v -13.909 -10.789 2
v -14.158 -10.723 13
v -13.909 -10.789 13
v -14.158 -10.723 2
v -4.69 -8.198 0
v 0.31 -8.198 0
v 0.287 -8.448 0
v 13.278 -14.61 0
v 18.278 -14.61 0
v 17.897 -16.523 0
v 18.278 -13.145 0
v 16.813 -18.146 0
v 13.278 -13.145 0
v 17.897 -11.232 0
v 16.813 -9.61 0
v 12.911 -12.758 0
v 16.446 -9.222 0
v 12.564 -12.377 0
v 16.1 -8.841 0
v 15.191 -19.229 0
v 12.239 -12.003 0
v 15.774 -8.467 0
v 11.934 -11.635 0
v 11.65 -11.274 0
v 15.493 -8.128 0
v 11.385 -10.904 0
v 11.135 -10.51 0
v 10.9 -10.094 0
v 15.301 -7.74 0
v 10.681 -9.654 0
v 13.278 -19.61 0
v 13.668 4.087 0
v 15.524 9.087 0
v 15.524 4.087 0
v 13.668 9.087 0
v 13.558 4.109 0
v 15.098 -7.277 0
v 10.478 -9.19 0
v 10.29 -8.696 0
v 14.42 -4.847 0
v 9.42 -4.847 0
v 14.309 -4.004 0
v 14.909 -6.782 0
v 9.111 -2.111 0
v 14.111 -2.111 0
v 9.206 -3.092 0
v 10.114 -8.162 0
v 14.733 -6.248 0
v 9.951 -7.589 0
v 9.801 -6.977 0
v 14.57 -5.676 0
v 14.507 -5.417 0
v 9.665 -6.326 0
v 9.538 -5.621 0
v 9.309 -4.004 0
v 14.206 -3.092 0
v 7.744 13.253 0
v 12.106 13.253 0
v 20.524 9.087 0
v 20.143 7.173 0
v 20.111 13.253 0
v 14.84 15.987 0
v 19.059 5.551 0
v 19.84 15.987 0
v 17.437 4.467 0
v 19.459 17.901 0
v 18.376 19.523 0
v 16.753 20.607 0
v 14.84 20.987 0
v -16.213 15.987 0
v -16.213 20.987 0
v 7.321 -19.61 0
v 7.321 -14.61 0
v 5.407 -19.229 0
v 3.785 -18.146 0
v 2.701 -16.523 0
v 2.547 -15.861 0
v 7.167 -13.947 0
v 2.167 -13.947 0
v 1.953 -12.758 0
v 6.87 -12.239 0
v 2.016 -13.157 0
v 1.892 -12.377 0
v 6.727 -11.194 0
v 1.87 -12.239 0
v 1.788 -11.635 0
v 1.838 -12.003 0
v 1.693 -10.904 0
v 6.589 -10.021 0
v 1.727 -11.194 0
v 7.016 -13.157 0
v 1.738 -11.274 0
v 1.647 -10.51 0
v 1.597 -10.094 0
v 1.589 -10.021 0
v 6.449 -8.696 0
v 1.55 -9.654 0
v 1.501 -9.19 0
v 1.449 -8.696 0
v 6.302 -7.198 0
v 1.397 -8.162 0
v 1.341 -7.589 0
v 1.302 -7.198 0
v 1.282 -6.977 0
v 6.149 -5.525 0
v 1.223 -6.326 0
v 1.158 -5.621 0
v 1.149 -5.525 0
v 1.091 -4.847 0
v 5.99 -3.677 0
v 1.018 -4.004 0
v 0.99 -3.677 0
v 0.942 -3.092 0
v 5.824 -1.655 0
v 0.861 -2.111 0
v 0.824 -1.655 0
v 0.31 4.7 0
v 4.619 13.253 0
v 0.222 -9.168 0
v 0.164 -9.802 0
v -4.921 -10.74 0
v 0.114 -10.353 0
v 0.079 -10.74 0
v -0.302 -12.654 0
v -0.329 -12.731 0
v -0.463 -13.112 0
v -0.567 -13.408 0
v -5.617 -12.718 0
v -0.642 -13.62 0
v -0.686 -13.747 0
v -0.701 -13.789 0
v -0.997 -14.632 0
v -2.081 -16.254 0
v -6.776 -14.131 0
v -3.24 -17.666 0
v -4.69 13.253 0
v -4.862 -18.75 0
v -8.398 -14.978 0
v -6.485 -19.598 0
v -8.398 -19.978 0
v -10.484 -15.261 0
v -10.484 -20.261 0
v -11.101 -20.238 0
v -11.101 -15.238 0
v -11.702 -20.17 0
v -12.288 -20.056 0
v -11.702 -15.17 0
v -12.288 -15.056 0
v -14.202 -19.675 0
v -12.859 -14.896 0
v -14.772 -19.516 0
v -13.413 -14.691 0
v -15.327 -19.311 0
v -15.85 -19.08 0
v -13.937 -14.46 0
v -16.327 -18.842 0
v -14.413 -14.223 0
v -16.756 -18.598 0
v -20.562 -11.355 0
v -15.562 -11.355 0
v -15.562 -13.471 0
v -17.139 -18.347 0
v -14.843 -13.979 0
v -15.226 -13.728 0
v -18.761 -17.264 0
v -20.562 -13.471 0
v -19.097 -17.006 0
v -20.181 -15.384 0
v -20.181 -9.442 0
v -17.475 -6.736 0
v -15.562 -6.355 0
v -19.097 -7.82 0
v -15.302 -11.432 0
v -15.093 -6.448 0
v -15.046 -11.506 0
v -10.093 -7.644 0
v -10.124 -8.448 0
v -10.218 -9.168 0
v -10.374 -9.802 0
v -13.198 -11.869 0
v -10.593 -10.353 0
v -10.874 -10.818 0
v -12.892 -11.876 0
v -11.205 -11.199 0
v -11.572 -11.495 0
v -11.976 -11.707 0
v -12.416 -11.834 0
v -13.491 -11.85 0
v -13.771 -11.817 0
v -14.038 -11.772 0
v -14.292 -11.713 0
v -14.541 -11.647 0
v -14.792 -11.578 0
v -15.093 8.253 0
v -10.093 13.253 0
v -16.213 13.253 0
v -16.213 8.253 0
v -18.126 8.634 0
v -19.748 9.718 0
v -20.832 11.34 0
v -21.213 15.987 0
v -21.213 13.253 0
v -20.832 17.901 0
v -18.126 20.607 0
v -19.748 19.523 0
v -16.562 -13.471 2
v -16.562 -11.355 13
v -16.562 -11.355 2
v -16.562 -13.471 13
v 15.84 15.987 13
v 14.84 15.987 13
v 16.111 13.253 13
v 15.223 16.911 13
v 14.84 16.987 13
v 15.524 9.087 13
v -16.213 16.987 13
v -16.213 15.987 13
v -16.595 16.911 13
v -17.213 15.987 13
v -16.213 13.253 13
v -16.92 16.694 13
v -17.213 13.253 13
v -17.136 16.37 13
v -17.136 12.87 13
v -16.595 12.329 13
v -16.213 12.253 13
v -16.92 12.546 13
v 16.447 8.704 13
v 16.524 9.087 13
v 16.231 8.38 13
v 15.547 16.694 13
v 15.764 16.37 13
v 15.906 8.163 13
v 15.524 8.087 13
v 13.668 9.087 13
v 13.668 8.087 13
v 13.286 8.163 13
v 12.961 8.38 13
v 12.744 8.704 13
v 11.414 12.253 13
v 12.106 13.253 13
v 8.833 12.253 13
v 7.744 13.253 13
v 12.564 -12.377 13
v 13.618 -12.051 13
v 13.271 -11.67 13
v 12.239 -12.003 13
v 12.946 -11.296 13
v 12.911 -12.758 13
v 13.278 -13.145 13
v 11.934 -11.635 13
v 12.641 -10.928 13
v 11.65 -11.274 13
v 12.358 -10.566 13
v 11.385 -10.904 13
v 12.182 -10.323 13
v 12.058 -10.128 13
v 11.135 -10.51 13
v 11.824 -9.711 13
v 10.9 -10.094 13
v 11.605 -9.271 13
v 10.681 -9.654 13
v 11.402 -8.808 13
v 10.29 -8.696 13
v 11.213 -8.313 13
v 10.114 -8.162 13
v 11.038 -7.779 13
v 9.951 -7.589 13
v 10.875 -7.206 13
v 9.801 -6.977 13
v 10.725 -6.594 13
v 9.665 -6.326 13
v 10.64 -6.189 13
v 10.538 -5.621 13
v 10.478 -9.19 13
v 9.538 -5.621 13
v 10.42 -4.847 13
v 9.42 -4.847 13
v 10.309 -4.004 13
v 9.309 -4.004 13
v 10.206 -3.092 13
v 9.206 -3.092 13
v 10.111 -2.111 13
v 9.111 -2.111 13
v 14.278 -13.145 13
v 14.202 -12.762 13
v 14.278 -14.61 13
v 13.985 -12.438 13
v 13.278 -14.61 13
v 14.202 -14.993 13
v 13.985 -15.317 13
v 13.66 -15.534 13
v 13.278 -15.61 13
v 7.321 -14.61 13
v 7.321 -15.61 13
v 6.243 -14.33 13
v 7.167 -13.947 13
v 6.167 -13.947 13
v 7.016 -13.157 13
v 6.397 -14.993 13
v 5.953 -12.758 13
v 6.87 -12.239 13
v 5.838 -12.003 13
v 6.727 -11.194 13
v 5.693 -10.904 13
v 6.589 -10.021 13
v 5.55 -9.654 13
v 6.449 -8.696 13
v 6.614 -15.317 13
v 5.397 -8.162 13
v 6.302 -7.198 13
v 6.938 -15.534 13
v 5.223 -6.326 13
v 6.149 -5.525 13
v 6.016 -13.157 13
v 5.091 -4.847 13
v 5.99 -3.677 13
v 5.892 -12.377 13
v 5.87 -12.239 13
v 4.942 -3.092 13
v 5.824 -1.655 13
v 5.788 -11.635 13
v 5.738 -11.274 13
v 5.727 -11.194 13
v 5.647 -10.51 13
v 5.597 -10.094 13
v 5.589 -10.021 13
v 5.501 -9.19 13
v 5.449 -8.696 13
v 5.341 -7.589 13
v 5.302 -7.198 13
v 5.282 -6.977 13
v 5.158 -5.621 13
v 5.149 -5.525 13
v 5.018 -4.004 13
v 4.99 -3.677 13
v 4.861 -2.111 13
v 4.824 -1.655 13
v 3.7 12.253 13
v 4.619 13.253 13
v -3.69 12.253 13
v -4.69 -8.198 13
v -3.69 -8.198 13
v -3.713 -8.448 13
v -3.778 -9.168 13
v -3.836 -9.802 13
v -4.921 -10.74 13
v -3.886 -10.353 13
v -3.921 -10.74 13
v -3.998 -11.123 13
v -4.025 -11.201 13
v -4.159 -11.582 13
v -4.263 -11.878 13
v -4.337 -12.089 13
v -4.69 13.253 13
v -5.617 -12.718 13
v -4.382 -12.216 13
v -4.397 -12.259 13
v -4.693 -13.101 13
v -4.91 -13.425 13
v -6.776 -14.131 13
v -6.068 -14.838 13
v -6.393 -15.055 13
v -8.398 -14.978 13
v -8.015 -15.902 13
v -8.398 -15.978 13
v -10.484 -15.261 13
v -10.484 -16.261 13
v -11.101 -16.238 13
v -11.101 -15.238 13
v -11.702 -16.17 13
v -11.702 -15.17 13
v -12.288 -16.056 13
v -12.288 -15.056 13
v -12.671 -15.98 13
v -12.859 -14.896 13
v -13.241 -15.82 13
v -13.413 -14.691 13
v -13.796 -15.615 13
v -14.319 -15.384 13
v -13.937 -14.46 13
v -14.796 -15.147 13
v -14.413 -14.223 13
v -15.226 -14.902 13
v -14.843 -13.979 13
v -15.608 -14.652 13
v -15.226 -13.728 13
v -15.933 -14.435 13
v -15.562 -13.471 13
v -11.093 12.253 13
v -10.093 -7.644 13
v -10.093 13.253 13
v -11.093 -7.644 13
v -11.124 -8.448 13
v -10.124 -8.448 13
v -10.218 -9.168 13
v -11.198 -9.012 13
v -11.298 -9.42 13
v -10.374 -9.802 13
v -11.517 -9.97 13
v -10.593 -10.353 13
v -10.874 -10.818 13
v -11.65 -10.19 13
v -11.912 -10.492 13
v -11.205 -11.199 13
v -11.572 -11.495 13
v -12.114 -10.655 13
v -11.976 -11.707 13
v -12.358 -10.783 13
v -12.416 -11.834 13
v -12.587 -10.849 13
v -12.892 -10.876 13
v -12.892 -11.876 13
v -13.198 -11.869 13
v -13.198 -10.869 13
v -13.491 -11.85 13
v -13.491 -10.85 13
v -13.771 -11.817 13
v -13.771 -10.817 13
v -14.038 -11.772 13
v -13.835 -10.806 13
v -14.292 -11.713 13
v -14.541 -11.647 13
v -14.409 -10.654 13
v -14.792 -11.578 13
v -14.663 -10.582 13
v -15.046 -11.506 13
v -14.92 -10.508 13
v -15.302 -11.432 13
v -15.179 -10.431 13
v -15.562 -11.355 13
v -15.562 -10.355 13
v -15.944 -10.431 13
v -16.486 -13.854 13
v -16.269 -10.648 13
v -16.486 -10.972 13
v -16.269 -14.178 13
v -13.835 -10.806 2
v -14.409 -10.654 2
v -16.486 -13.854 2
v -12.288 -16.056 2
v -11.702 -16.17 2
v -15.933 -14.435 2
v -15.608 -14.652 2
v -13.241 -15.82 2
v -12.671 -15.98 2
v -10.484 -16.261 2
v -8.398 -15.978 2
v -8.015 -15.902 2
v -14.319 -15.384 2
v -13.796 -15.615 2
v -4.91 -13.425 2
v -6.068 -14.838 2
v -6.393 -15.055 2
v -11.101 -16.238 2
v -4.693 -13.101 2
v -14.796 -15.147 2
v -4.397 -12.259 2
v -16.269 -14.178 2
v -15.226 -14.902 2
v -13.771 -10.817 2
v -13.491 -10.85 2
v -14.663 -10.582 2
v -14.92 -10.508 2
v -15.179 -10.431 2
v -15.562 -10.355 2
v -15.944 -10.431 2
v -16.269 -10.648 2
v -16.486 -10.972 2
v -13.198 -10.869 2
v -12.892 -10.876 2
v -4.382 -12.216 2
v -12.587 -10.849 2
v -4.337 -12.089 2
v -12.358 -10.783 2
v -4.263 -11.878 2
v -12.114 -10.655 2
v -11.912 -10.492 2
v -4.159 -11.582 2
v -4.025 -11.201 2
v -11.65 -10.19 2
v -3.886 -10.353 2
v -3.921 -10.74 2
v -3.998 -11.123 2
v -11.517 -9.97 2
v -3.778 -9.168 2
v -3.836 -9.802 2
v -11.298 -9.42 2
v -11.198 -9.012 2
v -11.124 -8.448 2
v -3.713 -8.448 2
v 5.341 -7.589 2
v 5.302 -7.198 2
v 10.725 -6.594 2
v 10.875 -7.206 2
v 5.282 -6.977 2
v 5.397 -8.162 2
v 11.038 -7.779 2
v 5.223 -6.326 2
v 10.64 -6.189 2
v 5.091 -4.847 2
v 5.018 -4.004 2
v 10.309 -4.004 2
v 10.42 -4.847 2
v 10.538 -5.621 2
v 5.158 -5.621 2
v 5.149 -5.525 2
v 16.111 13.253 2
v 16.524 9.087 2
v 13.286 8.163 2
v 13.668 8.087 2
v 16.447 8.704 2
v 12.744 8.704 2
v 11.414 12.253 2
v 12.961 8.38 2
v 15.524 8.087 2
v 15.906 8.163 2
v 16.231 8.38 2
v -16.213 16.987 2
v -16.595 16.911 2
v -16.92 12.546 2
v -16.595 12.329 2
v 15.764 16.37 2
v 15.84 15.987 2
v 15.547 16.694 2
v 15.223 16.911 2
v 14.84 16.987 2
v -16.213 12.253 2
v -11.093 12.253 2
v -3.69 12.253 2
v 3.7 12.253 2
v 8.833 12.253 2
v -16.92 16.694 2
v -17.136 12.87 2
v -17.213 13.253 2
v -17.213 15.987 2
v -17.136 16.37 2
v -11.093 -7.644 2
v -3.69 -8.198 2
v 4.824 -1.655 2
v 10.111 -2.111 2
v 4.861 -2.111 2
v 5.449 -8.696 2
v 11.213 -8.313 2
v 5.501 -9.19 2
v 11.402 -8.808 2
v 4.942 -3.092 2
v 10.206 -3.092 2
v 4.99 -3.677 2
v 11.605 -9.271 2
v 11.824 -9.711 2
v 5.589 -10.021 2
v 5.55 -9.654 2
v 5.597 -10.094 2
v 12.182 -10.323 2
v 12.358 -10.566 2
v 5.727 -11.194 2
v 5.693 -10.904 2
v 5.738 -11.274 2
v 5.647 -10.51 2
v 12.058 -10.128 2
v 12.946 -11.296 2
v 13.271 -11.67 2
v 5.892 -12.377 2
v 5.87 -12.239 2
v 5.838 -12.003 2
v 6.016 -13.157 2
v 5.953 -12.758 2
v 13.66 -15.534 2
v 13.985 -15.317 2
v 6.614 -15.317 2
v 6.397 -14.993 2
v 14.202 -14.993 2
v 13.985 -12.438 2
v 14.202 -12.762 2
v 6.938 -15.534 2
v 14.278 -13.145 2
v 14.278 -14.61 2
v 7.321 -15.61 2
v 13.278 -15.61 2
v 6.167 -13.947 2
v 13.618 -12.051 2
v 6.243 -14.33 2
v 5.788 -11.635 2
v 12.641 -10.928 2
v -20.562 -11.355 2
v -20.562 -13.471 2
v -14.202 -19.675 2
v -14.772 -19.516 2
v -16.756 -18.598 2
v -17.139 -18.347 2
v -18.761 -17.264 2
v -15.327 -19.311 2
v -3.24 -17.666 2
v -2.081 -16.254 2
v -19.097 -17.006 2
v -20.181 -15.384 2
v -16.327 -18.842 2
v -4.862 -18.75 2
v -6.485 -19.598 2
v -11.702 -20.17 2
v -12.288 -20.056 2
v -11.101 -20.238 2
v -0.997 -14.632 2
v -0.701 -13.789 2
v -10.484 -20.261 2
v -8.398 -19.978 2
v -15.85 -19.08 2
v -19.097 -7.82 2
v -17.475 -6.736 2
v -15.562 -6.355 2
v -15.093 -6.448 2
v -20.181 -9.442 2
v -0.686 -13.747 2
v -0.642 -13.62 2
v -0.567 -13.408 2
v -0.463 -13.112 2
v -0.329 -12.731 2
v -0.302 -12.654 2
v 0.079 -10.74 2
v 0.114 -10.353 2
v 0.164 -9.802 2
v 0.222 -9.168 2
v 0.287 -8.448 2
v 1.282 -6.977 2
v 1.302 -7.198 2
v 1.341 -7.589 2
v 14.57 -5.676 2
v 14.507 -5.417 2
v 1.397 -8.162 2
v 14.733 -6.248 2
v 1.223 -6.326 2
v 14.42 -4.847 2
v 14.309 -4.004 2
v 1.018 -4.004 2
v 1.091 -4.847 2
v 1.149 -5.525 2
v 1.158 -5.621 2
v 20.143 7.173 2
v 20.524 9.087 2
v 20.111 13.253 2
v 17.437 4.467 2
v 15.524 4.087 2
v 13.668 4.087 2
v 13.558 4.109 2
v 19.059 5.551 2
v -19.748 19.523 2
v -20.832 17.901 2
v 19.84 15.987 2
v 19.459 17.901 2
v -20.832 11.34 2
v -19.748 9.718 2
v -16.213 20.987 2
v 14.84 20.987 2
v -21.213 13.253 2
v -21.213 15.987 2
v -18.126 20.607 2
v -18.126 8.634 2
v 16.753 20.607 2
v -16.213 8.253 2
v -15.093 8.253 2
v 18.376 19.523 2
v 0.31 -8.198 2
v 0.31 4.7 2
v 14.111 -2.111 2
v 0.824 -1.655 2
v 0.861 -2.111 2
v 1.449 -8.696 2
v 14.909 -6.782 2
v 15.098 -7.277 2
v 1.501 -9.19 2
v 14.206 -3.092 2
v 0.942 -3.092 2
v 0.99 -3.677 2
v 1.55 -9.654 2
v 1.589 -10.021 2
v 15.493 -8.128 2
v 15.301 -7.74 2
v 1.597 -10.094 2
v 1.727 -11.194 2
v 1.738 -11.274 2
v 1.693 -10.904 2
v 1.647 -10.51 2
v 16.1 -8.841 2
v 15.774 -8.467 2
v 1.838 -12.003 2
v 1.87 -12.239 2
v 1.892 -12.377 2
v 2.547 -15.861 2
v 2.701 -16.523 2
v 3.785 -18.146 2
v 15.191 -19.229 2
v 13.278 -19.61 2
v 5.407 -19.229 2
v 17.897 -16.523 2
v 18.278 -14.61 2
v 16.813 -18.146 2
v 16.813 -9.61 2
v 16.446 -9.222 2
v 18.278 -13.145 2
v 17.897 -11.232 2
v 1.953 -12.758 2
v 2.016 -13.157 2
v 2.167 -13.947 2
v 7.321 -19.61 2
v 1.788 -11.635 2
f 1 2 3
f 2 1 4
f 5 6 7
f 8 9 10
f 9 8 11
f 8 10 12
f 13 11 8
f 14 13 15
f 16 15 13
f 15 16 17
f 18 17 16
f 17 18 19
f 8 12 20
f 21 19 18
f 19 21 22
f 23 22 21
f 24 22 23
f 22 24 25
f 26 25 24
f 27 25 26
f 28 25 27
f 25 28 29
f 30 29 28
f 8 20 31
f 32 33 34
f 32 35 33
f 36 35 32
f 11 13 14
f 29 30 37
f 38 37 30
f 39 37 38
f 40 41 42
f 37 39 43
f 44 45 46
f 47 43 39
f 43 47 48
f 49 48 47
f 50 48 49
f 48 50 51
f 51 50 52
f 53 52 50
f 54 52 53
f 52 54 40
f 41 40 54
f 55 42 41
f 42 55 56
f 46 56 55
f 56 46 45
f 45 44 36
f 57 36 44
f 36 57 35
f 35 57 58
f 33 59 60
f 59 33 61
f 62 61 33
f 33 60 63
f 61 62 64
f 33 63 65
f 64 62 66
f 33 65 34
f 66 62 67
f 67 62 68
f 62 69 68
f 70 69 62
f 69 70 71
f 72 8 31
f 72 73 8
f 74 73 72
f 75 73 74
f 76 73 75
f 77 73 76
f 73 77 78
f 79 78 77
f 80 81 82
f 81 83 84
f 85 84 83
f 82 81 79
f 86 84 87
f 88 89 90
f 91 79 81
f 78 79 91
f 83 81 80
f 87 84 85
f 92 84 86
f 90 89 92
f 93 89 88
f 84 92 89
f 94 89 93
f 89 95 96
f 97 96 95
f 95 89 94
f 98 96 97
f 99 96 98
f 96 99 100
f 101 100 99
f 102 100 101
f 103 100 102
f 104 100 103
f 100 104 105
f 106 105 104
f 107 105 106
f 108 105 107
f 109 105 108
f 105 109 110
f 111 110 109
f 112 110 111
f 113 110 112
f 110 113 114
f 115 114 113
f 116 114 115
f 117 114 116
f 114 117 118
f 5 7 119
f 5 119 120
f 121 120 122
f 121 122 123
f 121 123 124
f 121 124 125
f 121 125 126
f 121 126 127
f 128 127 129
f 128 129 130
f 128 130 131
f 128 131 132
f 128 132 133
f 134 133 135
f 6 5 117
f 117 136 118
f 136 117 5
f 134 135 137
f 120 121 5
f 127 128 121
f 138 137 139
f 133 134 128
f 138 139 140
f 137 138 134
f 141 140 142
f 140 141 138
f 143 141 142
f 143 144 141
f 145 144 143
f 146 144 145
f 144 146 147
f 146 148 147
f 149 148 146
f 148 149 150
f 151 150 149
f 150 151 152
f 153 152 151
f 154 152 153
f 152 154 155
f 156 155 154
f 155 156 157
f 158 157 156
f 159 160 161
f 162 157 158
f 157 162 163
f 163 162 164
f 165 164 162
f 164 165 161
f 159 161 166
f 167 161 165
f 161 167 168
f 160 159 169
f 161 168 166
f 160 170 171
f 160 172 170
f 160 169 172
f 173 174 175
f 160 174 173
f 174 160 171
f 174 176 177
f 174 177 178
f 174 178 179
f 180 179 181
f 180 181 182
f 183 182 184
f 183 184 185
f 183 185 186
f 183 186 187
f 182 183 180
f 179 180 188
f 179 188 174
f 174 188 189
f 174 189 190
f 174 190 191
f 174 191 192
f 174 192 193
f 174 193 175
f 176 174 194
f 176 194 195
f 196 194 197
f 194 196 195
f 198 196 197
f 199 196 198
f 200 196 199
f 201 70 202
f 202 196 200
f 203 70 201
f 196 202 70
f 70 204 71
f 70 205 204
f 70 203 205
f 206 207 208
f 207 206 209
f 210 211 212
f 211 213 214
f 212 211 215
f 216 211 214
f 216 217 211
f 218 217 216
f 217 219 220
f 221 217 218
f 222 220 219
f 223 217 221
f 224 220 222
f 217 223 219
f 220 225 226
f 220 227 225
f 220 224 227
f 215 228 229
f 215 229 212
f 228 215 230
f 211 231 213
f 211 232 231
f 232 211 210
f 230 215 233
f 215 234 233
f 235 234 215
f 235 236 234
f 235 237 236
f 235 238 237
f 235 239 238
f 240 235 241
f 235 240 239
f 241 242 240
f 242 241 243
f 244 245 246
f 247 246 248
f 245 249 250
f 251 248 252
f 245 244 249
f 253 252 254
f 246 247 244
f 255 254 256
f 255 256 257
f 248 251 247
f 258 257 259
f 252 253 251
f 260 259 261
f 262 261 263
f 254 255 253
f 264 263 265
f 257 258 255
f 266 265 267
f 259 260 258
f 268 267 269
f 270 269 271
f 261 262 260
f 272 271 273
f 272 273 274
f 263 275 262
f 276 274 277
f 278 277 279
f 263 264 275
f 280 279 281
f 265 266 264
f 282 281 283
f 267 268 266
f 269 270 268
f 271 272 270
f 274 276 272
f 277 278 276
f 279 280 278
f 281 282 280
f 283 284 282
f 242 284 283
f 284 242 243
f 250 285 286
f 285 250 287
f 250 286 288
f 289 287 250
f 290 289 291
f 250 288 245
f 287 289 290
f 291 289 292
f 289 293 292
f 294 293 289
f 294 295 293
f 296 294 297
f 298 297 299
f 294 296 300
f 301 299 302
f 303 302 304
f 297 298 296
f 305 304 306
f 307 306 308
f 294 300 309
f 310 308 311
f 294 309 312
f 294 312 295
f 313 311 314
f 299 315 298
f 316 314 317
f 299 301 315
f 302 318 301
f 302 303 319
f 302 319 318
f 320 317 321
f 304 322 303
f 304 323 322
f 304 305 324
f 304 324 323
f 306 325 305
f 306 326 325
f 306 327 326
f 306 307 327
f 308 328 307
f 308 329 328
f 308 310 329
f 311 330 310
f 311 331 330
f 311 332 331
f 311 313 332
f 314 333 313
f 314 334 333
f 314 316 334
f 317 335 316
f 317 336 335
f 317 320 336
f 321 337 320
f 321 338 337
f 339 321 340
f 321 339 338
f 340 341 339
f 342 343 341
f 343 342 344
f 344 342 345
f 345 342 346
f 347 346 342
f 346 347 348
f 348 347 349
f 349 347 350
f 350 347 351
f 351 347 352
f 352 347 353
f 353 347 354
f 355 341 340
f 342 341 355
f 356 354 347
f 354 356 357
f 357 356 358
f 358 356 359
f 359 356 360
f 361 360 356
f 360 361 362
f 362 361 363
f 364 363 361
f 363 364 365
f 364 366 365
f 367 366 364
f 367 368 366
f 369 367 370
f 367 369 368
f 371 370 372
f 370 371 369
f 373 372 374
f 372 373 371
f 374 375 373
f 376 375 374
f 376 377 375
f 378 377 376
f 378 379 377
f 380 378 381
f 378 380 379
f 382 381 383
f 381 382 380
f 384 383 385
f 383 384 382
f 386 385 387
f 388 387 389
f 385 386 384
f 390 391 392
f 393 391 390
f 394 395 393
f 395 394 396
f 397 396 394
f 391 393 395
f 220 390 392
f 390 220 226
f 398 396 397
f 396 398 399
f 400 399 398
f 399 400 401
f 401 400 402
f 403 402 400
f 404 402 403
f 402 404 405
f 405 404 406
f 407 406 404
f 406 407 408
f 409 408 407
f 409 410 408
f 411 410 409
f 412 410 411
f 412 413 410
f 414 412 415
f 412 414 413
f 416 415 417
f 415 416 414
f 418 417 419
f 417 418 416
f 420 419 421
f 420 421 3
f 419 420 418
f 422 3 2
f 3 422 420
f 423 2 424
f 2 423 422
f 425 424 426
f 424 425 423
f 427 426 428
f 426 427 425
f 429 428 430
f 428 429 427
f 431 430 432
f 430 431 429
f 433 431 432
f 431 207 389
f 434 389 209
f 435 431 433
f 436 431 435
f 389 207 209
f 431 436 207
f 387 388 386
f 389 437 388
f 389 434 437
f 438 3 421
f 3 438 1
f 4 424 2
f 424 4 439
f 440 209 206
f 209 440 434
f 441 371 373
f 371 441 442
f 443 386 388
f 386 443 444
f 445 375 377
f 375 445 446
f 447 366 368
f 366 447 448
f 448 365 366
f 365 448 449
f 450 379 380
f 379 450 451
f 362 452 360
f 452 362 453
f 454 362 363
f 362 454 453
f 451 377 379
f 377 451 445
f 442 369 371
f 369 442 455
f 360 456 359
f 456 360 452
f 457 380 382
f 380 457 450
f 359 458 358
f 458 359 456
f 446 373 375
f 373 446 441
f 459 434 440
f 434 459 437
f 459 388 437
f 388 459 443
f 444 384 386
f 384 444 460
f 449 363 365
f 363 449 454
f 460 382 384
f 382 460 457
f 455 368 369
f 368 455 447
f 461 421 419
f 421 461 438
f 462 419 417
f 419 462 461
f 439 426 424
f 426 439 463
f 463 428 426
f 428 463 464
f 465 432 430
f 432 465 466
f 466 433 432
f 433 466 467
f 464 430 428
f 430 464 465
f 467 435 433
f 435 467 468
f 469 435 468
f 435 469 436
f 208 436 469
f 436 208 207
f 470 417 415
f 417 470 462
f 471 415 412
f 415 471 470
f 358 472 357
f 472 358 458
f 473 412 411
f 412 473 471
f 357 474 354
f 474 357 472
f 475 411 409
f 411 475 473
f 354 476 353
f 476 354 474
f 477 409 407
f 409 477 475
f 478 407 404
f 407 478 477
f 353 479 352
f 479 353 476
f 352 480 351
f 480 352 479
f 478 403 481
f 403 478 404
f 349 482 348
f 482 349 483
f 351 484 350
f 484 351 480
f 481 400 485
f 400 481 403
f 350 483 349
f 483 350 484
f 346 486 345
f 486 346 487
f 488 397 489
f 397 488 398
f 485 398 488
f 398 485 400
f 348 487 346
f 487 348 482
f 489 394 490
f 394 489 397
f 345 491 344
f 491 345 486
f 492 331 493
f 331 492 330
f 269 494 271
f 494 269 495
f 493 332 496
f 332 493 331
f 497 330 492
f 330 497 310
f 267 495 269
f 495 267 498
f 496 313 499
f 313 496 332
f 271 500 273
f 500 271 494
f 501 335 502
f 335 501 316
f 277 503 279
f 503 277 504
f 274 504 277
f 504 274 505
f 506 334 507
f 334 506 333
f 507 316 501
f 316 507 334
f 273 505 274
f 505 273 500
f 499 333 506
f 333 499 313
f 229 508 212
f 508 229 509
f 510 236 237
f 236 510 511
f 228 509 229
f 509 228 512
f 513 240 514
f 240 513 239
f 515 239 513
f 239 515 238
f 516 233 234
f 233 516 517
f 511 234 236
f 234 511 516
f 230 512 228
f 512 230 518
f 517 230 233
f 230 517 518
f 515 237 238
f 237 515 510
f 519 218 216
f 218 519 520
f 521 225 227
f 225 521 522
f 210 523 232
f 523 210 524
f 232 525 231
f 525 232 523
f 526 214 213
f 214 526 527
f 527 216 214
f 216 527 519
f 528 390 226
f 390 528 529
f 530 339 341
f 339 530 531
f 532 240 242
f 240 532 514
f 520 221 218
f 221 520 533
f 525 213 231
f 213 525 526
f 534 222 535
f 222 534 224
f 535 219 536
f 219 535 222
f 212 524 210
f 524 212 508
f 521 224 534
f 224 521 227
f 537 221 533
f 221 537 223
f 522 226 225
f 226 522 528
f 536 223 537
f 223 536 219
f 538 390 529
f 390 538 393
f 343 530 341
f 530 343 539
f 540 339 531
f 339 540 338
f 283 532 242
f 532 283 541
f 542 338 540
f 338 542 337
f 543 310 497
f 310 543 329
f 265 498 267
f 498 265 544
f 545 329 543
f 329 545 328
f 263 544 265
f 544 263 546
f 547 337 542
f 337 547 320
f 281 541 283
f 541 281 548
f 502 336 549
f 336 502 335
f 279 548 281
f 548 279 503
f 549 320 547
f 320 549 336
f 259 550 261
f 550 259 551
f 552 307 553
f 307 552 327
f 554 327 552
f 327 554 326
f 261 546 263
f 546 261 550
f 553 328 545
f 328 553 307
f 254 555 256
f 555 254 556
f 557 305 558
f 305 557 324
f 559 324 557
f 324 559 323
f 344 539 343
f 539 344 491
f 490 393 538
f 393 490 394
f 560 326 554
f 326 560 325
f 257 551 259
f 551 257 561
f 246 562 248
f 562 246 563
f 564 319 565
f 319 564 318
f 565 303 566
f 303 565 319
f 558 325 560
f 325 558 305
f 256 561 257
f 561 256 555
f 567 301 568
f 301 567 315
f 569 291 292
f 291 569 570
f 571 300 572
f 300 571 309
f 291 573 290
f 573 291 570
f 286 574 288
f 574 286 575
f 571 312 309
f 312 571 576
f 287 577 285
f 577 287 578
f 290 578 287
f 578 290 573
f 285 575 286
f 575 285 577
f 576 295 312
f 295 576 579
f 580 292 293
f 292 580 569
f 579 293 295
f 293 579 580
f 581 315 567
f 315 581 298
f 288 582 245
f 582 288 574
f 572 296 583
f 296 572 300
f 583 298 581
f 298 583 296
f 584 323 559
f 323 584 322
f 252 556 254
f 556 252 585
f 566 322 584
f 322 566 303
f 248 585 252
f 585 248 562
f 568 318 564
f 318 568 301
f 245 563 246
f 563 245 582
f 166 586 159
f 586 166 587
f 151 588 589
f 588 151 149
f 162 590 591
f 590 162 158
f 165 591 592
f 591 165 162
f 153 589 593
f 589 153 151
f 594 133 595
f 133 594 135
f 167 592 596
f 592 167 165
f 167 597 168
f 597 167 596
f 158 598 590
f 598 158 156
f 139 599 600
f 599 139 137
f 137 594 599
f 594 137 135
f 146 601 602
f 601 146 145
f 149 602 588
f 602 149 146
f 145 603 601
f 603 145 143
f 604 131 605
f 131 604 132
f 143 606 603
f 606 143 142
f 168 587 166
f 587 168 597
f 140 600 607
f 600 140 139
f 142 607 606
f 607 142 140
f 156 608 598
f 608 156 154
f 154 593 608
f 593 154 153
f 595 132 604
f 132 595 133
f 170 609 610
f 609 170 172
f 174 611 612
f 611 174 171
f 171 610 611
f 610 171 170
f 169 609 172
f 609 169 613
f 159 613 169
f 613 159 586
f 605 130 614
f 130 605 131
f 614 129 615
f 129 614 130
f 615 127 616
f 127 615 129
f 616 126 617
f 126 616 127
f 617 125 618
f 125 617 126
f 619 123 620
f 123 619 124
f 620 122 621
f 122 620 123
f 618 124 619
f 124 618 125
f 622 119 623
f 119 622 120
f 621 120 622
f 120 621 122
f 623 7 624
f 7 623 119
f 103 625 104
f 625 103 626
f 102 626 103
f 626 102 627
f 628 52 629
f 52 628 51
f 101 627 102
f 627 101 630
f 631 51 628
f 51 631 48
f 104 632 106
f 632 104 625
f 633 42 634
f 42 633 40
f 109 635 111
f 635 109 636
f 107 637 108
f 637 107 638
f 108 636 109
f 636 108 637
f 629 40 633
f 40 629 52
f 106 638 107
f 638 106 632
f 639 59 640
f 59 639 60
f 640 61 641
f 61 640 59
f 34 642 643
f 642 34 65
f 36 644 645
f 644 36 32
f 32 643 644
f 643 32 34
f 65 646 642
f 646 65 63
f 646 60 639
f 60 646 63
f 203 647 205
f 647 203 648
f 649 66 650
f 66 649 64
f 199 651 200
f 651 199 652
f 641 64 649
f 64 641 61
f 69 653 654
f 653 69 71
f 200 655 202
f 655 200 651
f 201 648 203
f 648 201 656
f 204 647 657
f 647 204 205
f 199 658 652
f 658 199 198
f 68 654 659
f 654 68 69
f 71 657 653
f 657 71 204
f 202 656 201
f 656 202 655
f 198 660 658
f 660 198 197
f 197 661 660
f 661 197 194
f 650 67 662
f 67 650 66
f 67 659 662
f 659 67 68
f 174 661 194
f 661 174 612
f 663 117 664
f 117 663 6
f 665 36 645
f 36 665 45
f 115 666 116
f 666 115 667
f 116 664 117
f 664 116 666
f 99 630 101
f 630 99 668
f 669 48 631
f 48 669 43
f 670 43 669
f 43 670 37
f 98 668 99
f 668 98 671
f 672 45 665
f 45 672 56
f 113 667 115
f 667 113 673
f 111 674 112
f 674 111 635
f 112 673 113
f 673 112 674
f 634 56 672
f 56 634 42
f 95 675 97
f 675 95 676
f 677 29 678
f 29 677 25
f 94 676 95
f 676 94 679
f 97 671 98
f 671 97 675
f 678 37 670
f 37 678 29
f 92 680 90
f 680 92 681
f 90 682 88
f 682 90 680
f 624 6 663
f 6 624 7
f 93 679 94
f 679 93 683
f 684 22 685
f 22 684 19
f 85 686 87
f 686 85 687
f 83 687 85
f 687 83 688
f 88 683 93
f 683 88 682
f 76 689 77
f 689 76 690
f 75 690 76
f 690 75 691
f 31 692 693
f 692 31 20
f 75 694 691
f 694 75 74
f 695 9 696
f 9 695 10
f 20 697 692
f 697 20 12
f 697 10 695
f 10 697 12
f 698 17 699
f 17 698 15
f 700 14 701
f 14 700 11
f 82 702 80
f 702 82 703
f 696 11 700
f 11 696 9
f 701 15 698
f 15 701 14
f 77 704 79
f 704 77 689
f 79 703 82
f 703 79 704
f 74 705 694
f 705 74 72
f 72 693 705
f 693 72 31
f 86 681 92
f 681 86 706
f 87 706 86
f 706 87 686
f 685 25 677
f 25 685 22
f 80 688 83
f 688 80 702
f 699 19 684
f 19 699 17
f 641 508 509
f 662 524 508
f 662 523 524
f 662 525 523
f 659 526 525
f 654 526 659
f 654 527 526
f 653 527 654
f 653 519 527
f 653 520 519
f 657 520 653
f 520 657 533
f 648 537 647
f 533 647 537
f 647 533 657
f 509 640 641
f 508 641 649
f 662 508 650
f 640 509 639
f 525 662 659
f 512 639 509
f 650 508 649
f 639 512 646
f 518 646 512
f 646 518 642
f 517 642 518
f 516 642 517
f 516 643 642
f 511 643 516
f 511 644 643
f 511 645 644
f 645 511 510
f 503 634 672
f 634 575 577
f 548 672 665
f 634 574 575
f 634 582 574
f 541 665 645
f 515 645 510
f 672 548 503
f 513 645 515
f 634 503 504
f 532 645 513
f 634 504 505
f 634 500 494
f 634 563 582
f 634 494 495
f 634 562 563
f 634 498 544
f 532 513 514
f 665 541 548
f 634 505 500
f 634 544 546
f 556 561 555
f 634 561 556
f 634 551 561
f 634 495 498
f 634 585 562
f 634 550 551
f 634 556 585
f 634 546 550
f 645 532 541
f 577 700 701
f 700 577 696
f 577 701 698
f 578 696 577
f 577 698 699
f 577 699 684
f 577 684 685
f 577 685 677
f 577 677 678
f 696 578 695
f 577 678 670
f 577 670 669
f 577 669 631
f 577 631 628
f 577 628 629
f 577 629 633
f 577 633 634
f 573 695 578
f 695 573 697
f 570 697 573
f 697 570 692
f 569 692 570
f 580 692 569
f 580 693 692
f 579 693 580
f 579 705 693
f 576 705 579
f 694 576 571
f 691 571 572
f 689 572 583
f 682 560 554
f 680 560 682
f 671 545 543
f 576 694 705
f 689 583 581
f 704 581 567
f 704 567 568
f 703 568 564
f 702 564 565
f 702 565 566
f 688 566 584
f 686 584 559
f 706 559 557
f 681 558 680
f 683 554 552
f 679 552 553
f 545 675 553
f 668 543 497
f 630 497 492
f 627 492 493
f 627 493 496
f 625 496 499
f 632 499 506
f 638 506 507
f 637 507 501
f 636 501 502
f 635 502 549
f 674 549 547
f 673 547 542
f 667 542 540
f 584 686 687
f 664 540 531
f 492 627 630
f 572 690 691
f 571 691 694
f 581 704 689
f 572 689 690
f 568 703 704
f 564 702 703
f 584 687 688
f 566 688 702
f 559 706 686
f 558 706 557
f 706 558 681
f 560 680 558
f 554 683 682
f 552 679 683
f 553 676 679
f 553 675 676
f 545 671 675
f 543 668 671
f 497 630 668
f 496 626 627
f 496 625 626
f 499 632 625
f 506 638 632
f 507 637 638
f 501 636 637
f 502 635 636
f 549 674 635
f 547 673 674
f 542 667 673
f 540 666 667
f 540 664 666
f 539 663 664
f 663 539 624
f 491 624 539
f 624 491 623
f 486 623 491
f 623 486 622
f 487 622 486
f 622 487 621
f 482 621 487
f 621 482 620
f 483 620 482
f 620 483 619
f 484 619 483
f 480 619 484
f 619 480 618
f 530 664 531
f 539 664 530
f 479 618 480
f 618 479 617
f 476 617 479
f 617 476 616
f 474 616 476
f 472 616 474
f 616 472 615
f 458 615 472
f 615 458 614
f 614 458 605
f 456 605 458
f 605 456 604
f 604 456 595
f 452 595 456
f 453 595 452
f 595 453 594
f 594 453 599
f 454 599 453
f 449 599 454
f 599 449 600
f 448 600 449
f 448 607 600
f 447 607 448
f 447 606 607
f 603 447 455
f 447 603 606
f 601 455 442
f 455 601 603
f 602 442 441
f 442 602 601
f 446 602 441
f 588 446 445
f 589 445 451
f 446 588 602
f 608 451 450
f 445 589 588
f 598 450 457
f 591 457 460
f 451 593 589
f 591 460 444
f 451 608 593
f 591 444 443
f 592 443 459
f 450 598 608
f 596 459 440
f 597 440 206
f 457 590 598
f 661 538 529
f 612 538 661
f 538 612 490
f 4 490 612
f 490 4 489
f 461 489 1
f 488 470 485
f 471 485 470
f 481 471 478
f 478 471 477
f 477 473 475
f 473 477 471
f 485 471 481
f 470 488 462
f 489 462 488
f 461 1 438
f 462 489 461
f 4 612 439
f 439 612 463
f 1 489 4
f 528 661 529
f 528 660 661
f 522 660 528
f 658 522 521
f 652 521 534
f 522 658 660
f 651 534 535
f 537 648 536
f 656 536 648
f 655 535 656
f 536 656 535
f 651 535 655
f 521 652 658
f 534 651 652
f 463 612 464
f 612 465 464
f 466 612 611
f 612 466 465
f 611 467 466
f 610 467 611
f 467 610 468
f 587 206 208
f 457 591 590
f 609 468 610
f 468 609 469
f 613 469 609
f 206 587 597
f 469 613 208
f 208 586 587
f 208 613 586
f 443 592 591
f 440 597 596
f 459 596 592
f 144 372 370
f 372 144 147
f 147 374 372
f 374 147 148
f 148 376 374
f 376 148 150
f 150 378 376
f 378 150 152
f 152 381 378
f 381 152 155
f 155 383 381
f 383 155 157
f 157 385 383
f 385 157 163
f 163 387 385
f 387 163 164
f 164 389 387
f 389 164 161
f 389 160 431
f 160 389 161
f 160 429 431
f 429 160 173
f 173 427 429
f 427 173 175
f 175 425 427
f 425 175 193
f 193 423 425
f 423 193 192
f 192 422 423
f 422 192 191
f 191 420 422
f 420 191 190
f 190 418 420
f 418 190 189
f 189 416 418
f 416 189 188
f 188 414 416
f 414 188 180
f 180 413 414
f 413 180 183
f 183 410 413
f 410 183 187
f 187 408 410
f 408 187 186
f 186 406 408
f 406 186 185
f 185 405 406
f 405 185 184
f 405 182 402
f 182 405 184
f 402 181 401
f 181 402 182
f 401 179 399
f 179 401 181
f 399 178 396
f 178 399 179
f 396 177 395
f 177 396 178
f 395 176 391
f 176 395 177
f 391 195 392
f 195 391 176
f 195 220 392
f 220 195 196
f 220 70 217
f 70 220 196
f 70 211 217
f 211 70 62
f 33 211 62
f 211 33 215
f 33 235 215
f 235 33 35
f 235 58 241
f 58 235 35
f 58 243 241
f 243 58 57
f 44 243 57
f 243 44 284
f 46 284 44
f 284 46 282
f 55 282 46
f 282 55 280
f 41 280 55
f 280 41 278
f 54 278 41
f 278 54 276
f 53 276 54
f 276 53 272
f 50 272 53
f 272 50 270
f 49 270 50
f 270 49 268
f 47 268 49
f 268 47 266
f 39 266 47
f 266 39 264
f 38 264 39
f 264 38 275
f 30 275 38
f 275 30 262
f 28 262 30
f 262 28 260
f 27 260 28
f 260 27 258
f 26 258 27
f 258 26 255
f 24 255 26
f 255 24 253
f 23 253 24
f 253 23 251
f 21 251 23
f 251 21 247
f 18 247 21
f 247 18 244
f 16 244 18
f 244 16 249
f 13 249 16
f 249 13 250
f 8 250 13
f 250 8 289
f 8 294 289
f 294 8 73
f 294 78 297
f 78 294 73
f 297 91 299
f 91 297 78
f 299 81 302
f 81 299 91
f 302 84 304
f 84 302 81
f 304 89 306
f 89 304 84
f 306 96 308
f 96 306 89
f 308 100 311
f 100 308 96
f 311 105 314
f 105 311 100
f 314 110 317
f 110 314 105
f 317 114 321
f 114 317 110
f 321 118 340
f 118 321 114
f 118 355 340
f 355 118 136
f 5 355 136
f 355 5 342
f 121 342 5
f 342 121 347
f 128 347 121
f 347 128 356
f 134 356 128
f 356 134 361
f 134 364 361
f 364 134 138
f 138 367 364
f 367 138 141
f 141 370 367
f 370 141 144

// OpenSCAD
// The symbol to make a cookie cutter. 
// You can copy/paste from a text editor. Any symbol from the font allowed (e.g. "∫∞∑Ω℮π→")
text="π";
// Put 1 if you want to have supporting lines for the inner holes.
// It is necessary for symbols like 'o', 'a'. Symbols without inner holes don't need it ('s', 't',...)
lines=0;
// Angle of the supporting lines
lines_angle=45;

// The font you want to use. You can change style like that: "Times New Roman:style=Bold". There are a lot of fancy symbols in the "Symbol" font.
font = "Times New Roman";

// The letter size. If you have a problem cutting dough, use larger font.
letter_size = 48;

module solid()
mirror([1,0,0])
linear_extrude(height = 5, convexity = 10) {
projection(cut=false) 
letter(text);
}

$fn=16;

module letter(l) {
    linear_extrude(height = 1, convexity = 10) {
   
        text(l, size = letter_size, font = font, halign = "center", valign = "center", $fn = 32);
    }
}

module OuterShape()
        minkowski()
        {
            solid();
            cylinder(d=2, h=8);
        }


module Cutter()
difference()
{
    union()
    {
        OuterShape();
        intersection()
        {
            scale([500,500,4])
            cube(1, center=true);
            
            minkowski()
            {
                solid();
                //sphere(1);
                cylinder(d=10, h=2);
            }
        }    
    }
    translate([0,0,-5])
    scale([1,1,20])
    solid();
}

module Lines()
{
    intersection()
    {
        rotate([0,0,lines_angle])
        for(i=[-50:15:50])
        translate([-200,i,0])
        scale([400,3,2])
        cube(1);
        
        OuterShape();
    }
}

if(lines==1)
{
    Lines();
}
Cutter();

